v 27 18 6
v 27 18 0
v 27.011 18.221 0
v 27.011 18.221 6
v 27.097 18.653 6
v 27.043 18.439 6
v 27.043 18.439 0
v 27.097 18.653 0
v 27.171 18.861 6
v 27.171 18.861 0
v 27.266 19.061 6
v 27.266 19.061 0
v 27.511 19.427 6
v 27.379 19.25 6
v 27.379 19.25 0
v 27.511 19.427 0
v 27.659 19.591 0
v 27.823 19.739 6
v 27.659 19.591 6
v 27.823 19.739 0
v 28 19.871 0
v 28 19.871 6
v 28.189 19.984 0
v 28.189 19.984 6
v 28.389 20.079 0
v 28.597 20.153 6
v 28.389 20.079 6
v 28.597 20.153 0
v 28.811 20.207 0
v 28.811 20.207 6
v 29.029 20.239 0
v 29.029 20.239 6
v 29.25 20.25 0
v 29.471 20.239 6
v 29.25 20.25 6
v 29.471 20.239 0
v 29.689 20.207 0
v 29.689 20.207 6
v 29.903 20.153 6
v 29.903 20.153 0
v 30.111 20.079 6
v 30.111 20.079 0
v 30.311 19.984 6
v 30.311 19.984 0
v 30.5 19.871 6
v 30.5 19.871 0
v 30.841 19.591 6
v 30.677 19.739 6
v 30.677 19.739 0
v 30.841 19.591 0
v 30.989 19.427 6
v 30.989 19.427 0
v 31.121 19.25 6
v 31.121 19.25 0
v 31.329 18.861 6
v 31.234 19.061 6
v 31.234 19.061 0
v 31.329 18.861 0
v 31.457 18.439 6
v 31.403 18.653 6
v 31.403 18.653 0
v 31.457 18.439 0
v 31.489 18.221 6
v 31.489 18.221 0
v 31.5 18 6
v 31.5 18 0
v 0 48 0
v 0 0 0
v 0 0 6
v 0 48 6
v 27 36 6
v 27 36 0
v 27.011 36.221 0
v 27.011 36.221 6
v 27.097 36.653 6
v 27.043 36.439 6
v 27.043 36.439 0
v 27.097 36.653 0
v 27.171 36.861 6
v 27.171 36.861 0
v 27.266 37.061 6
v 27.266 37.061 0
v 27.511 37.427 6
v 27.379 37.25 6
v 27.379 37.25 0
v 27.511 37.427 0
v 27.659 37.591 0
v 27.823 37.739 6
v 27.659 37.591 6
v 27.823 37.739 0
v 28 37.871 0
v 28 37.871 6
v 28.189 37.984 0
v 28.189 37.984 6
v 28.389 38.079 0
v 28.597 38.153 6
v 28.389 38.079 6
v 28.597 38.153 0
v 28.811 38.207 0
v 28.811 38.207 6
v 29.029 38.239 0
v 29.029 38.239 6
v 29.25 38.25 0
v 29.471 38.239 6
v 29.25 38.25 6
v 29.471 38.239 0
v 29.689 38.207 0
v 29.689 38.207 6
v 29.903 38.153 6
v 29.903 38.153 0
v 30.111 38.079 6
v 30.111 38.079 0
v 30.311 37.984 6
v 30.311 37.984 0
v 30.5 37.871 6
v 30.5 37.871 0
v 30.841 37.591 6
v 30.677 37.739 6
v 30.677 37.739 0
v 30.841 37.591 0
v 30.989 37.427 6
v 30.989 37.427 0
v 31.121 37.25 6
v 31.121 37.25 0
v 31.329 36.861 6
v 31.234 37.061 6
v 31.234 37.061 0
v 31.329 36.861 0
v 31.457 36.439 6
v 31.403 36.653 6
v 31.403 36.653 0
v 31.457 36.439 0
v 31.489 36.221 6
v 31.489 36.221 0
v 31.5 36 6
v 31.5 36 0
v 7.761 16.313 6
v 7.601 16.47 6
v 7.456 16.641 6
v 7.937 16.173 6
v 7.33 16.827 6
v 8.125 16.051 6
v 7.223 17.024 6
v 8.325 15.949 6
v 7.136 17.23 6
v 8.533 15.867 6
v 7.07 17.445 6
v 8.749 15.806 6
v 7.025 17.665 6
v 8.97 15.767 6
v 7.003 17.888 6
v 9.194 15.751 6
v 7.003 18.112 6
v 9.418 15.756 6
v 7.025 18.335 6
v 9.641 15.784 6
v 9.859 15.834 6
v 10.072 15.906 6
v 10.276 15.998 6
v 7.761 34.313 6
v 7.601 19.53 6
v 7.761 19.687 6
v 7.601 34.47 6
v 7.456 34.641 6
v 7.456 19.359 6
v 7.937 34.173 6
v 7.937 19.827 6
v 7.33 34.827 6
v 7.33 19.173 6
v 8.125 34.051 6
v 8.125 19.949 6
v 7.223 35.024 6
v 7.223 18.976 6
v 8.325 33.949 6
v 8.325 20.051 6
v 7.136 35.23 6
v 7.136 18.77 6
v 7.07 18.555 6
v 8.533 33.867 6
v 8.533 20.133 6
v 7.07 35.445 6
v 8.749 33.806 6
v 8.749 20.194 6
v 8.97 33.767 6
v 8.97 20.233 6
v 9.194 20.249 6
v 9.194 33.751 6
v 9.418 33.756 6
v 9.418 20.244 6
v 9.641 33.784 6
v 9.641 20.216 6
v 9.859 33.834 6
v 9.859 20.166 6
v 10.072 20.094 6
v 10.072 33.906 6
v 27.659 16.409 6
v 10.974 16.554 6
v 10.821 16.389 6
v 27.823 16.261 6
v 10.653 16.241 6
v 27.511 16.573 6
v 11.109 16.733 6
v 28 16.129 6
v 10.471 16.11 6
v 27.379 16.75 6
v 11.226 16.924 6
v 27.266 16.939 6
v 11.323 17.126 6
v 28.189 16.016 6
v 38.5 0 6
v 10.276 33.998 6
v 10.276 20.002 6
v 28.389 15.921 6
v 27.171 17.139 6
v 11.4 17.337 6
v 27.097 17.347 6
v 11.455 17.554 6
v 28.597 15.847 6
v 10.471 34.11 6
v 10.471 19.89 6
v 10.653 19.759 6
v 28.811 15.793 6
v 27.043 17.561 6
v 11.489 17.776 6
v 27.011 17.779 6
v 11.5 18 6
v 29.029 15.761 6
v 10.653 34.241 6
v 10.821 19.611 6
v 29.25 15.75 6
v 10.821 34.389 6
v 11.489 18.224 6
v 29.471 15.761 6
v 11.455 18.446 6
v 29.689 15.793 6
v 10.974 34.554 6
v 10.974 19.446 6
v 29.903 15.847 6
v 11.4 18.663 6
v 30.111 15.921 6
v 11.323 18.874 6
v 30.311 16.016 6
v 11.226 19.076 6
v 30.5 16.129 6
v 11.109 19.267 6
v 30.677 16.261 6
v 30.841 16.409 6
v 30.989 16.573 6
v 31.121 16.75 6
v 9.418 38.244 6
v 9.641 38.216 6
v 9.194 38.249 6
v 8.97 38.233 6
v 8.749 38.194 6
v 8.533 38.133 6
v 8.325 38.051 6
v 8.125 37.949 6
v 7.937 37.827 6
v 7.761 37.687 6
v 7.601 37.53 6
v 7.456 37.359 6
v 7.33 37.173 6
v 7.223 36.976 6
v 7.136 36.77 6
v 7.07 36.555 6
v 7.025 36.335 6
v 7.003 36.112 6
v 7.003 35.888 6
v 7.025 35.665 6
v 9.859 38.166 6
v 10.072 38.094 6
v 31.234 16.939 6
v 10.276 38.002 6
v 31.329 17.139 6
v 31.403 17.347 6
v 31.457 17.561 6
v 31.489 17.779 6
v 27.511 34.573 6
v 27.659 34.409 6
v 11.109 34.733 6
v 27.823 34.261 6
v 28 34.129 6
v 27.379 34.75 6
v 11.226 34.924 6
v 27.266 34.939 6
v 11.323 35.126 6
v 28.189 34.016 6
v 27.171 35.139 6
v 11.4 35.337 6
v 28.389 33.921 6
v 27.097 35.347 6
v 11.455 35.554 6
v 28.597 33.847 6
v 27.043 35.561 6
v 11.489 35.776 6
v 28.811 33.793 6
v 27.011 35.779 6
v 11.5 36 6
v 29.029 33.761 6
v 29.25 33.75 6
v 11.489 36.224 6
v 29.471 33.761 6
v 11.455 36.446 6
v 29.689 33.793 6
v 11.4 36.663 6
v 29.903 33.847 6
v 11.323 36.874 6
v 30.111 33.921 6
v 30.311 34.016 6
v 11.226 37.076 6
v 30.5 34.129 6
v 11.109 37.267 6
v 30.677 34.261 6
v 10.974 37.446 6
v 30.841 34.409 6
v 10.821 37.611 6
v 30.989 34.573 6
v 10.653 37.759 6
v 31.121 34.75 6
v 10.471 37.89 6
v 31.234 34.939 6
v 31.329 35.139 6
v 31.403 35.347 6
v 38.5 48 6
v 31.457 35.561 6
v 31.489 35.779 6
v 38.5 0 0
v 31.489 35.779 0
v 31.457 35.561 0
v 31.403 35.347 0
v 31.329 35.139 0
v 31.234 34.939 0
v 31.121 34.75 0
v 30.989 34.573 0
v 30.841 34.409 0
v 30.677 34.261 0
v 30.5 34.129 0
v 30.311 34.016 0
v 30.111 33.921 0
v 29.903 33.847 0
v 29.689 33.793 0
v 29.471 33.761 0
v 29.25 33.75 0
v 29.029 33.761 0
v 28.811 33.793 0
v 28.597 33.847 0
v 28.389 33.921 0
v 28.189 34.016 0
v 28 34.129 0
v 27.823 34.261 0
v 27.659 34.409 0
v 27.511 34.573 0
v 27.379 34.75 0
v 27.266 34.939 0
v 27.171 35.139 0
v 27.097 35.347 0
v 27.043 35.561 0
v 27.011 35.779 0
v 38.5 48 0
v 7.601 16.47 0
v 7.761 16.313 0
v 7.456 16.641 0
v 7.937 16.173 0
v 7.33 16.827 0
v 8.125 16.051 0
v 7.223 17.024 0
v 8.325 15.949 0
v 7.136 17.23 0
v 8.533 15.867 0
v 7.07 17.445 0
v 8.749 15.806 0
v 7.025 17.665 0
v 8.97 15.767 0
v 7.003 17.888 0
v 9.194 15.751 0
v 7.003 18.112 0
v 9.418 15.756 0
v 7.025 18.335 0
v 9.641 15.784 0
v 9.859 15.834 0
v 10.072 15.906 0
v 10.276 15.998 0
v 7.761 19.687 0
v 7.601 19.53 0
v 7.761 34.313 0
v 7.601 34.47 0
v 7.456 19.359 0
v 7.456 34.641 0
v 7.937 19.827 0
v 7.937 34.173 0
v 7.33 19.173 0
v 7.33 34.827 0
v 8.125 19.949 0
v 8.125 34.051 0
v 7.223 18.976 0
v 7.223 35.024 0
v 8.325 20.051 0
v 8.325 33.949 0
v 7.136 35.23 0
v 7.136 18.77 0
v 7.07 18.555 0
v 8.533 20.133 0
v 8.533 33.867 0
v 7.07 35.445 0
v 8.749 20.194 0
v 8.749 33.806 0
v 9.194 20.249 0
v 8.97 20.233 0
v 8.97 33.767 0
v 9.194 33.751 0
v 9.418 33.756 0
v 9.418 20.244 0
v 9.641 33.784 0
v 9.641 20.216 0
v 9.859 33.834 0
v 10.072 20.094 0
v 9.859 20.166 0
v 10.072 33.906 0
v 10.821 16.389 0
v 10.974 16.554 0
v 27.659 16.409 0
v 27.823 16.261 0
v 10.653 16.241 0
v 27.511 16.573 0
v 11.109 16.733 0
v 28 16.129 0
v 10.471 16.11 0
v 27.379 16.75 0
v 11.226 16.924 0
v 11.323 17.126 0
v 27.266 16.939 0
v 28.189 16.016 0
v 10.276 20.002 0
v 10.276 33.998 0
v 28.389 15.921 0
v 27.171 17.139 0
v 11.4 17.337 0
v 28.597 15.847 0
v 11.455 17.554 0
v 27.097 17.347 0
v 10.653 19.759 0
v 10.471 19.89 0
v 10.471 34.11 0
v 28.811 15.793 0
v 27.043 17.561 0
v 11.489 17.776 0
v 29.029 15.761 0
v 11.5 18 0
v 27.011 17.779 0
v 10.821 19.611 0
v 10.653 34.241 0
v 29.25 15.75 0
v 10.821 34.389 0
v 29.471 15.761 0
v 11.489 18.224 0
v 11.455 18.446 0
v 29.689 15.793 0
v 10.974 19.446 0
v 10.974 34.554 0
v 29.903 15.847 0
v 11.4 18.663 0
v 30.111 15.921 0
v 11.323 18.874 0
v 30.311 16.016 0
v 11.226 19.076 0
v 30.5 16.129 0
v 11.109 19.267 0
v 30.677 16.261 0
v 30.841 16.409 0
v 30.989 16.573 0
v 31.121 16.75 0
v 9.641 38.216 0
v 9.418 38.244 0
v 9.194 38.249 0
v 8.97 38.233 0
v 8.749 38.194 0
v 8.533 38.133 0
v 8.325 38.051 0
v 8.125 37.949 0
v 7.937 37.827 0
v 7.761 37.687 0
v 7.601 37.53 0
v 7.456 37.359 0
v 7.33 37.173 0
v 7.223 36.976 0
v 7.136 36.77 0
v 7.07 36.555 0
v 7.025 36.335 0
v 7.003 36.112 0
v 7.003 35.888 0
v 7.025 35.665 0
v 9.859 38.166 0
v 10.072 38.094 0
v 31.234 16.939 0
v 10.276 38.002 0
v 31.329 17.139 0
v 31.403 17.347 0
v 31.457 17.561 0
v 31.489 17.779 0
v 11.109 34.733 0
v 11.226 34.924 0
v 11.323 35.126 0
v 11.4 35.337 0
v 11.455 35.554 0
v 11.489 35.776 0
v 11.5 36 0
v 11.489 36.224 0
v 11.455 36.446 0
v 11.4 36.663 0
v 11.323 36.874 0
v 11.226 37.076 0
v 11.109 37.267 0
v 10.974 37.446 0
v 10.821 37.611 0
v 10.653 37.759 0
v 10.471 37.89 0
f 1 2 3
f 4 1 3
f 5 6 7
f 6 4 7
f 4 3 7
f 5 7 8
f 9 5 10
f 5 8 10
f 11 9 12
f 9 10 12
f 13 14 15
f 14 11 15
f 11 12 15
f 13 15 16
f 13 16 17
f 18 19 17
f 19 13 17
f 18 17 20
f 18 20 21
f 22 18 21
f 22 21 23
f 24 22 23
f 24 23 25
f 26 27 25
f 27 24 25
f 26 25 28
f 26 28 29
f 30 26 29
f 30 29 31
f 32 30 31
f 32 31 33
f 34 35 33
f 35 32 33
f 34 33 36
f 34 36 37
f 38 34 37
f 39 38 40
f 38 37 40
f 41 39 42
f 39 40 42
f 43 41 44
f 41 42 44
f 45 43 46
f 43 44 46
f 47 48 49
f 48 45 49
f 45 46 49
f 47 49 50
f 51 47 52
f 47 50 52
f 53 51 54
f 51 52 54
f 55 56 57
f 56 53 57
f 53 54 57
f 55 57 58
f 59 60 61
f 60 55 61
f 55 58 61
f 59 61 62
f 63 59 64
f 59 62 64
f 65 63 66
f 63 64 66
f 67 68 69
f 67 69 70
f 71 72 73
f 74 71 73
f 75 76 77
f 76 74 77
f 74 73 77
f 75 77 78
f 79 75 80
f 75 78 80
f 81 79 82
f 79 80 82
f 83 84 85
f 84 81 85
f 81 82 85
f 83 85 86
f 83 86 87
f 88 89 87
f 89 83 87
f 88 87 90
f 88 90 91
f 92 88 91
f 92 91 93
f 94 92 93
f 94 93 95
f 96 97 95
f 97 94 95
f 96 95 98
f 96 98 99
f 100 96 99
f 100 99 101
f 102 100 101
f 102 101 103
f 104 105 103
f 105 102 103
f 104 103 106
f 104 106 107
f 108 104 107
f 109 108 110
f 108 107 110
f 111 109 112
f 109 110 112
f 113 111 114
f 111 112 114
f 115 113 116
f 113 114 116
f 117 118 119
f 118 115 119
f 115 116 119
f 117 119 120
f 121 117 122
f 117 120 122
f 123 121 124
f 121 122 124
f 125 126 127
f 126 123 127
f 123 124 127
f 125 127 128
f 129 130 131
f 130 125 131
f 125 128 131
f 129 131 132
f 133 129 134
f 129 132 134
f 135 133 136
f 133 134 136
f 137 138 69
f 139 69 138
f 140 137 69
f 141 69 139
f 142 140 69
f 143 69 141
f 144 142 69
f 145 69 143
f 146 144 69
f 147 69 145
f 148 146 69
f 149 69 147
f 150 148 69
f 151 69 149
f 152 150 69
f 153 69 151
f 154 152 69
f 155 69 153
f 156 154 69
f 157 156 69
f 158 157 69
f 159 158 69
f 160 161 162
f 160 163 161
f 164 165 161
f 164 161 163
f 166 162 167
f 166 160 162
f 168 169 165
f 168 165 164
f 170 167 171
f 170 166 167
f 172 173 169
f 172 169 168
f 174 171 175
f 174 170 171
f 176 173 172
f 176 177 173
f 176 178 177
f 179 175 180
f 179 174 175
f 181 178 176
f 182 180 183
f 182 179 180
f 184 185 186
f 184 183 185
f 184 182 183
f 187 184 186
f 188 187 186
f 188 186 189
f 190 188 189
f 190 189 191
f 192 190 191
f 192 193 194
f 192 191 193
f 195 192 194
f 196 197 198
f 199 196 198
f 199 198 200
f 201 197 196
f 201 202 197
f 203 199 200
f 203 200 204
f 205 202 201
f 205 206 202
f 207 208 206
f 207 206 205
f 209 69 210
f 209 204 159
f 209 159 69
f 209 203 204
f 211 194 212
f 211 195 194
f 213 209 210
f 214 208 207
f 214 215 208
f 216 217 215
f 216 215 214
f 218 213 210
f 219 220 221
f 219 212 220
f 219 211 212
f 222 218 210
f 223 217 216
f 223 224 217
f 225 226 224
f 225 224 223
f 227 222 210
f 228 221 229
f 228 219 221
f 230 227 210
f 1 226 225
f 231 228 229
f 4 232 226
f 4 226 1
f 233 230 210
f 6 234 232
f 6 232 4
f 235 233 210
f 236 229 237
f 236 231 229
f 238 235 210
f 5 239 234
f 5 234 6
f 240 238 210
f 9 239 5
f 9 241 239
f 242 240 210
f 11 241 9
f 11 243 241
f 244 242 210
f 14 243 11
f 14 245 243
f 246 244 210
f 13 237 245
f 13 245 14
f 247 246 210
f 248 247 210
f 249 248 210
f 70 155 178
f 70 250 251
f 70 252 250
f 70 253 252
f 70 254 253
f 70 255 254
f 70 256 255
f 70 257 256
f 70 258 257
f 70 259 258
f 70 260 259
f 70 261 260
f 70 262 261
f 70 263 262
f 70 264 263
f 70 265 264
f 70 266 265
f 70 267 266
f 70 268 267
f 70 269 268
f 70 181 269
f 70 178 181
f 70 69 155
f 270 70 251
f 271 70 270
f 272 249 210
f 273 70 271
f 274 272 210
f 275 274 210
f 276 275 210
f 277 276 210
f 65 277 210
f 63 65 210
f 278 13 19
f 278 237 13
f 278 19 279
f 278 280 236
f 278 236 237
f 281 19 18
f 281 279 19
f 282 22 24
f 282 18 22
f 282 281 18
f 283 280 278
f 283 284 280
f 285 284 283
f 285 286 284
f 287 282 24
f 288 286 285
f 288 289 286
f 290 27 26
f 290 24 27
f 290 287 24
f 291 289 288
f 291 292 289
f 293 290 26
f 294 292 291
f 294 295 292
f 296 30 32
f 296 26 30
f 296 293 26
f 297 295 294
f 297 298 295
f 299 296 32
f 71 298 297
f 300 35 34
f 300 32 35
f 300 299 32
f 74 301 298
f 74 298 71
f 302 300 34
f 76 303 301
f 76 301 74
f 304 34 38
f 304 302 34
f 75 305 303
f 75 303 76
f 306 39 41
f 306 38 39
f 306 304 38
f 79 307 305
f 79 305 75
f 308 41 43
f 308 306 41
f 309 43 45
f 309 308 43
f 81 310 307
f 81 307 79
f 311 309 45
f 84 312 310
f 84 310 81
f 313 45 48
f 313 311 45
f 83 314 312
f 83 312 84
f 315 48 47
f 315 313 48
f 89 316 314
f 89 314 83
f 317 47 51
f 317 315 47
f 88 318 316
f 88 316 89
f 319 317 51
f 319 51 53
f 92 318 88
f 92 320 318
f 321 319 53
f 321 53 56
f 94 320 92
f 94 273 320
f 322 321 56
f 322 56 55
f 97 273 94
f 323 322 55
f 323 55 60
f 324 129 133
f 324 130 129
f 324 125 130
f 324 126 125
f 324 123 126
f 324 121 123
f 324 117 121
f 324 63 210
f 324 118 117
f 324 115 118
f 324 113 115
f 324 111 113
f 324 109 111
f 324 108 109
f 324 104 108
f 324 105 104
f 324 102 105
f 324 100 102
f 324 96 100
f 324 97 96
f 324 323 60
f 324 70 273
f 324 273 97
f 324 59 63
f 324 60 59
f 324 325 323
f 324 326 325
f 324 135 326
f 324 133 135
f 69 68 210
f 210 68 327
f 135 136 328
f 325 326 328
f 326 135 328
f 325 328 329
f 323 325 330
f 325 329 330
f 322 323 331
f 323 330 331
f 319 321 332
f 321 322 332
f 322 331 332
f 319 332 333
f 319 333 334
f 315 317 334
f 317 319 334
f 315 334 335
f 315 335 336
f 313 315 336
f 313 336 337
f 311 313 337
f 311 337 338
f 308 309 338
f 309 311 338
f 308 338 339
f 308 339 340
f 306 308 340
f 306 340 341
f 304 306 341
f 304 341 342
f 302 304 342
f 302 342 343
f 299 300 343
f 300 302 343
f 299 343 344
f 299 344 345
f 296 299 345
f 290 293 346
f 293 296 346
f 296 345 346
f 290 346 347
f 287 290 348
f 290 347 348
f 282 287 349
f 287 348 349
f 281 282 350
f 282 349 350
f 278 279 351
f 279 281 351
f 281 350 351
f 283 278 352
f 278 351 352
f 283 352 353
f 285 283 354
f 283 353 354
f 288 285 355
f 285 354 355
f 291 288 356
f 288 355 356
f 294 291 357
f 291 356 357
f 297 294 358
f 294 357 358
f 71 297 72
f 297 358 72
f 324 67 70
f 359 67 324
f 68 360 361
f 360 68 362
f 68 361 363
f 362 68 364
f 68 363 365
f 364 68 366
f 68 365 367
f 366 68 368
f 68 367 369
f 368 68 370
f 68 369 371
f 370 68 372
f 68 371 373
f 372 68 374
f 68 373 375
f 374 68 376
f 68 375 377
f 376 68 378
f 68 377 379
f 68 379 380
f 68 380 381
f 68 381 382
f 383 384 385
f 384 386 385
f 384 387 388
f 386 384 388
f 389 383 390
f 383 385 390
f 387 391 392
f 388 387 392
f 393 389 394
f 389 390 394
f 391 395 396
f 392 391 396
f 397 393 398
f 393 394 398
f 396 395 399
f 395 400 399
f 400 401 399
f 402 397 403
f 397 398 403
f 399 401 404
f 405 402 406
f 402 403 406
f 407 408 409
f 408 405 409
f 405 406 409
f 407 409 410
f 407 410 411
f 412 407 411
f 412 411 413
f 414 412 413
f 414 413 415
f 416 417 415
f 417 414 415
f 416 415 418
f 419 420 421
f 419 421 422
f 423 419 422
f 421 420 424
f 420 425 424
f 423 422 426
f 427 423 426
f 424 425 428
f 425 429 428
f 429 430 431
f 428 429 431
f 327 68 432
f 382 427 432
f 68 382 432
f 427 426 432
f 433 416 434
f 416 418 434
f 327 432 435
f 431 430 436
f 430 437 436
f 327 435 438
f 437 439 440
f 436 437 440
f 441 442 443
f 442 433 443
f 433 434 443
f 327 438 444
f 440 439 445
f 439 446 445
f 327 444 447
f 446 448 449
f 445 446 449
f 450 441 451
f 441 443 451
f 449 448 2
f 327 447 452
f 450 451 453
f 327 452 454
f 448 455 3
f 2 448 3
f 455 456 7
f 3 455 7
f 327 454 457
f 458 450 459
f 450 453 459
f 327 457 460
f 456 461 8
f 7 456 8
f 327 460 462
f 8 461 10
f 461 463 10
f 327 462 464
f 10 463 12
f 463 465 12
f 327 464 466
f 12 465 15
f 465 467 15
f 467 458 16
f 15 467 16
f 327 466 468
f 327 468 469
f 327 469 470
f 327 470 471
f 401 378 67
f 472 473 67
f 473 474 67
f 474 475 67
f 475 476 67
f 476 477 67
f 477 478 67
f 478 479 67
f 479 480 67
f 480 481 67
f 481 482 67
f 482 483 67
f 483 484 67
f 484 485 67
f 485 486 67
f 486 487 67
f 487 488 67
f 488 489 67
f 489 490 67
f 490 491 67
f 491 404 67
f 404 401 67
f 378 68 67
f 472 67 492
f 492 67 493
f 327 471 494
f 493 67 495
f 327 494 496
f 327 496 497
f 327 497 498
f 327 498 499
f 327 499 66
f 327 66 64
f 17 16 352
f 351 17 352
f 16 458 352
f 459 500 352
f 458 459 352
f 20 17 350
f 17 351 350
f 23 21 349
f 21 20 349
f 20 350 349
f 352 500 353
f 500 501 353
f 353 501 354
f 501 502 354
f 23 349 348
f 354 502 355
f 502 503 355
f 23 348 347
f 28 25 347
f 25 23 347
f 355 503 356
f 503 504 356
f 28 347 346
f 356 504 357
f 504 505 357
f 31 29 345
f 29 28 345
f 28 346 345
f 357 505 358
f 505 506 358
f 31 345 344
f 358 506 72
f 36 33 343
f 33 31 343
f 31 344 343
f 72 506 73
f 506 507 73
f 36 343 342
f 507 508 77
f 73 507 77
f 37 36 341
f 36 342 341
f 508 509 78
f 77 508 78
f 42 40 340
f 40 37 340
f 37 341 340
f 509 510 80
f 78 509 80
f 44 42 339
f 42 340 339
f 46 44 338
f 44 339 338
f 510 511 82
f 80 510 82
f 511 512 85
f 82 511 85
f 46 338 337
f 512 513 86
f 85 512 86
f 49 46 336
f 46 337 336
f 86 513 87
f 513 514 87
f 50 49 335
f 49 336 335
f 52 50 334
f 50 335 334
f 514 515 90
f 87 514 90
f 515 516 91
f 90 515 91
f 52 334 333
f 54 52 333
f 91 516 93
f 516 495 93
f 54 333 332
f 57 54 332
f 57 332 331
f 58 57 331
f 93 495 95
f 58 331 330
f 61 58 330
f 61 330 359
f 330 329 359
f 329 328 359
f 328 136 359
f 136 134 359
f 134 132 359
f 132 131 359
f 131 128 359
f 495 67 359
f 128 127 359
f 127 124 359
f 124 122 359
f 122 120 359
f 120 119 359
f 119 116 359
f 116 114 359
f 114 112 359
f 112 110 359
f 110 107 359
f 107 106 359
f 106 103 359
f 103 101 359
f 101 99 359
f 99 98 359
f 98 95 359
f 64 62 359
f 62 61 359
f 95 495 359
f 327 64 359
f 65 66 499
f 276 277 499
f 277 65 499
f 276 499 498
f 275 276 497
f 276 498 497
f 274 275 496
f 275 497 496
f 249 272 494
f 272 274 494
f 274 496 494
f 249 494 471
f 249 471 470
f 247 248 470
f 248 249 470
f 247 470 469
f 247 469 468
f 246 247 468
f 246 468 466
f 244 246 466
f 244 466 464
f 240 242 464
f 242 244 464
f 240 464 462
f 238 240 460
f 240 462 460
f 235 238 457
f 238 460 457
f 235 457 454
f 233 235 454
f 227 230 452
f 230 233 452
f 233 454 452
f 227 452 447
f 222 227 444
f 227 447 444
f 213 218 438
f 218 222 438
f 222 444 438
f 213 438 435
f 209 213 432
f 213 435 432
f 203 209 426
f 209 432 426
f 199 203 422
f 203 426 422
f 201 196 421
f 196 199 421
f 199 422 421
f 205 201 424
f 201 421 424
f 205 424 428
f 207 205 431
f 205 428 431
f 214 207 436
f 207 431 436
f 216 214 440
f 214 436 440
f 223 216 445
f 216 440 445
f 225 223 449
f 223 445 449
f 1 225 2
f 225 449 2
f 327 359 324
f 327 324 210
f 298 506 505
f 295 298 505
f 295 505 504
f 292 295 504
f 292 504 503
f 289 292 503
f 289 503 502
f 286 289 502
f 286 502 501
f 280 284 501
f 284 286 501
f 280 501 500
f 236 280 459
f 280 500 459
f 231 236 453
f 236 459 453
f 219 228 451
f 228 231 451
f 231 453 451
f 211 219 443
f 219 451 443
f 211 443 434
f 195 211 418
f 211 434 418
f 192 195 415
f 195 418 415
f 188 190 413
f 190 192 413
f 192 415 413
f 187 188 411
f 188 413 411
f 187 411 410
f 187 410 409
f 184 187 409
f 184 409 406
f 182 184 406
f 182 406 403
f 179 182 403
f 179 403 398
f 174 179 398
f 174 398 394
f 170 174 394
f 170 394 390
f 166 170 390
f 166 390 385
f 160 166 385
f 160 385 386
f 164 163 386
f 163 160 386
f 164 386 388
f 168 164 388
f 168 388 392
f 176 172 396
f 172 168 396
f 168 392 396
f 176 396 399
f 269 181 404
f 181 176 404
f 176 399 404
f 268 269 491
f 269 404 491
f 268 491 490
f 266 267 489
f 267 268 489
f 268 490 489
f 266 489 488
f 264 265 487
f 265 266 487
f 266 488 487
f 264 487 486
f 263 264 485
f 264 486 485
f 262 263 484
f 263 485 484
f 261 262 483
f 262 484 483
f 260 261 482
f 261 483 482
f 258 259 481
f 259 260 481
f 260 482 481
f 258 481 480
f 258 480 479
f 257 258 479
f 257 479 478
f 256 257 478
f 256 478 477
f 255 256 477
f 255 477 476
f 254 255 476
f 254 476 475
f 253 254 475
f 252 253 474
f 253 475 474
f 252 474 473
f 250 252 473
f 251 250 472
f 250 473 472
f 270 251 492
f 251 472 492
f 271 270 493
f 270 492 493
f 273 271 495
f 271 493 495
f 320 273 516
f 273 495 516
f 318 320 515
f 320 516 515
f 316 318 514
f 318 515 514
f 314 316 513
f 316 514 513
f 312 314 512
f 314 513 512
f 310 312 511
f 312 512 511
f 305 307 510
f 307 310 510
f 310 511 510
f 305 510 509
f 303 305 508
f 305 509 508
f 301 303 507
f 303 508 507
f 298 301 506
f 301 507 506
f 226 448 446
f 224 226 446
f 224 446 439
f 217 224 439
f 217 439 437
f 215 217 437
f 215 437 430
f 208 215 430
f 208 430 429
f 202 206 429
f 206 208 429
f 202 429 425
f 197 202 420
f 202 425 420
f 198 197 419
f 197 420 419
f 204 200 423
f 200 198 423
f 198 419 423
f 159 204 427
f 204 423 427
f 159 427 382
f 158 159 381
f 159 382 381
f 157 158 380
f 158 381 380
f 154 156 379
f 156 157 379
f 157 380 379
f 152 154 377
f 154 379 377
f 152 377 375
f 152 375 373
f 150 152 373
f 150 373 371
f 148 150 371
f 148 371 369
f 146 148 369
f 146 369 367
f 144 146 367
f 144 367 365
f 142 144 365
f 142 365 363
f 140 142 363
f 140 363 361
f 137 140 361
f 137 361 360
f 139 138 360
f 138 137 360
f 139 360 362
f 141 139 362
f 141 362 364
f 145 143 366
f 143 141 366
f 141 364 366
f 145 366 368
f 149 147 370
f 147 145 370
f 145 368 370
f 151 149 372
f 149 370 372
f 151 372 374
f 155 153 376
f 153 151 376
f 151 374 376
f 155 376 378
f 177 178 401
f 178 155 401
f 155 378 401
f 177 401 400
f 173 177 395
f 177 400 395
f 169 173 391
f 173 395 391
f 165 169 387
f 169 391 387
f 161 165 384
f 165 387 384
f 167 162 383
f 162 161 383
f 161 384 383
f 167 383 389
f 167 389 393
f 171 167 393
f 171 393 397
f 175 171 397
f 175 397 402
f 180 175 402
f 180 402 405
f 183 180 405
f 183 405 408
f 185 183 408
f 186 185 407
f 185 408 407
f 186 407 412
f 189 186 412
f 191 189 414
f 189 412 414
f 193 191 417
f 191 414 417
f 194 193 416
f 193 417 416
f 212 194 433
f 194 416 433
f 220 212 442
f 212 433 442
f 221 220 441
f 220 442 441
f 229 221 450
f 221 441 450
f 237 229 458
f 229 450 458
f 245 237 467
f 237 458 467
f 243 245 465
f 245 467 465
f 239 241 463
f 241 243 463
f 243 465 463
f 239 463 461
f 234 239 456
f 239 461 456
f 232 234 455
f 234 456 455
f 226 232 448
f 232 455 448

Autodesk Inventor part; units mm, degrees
ref_plane "YZ Plane" through (0, 0, 0) normal (1, 0, 0) x (0, 1, 0)
ref_plane "XZ Plane" through (0, 0, 0) normal (0, 1, 0) x (-1, 0, 0)
ref_plane "XY Plane" through (0, 0, 0) normal (0, 0, 1) x (1, 0, 0)
sketch "Sketch1" plane through (0, 0, 0) normal (0, 0, 1) x (1, 0, 0)
  line L0 (0, 0) -> (38.5, 0)
  line L1 (0, 0) -> (0, 48)
  line L2 (0, 48) -> (38.5, 48)
  line L3 (38.5, 48) -> (38.5, 0)
  circle A0 centre (9.25, 18) radius 2.25
  line L4 (9.25, 18) -> (29.25, 18)
  circle A1 centre (29.25, 18) radius 2.25
  circle A2 centre (9.25, 36) radius 2.25
  line L5 (9.25, 36) -> (29.25, 36)
  circle A3 centre (29.25, 36) radius 2.25
  dimension "d0" = 48
  dimension "d3" = 18
  dimension "d4" = 4.5
  dimension "d5" = 4.5
  dimension "d6" = 20
  dimension "d7" = 38.5
  dimension "d8" = 9.25
  dimension "d9" = 4.5
  dimension "d10" = 4.5
  dimension "d11" = 20
  dimension "d12" = 12
  dimension "d13" = 9.25
extrude "Extrusion1" add sketch "Sketch1" along normal blind 6
equation "\"d5\" = d4"
equation "\"d8\" = -0.5 * d6 + 0.5 * d7"
equation "\"d10\" = d9"
equation "\"d13\" = -0.5 * d11 + 0.5 * d7"
properties part number "BaseC_9" material "PMMA Plastic"
